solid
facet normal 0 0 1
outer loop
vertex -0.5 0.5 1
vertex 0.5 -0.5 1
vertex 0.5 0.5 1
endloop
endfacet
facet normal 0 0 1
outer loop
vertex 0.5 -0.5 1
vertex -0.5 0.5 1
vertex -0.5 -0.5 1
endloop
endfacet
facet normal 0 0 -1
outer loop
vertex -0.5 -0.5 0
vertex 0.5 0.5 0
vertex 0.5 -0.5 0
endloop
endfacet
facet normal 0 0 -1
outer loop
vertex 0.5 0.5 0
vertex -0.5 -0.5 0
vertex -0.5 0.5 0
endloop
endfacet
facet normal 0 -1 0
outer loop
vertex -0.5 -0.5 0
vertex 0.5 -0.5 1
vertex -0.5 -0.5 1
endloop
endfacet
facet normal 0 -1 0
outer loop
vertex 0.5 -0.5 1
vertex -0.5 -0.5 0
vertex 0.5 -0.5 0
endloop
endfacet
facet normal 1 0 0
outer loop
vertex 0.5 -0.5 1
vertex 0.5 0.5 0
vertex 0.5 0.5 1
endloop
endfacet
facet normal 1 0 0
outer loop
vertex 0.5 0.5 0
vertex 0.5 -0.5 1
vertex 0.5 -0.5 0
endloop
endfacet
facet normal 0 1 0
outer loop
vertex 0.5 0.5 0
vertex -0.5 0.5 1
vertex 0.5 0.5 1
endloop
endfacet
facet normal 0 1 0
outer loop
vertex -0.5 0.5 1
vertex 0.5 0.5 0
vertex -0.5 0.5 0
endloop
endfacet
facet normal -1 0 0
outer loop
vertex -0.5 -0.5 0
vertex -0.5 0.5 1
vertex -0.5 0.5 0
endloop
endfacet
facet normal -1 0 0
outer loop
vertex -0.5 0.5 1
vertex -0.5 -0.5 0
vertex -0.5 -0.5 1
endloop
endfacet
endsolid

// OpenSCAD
// Cube for Stacks of Shapes
// by Slashee the Cow

color("SandyBrown")
translate([0,0,0.5])
    cube(1, center = true);
